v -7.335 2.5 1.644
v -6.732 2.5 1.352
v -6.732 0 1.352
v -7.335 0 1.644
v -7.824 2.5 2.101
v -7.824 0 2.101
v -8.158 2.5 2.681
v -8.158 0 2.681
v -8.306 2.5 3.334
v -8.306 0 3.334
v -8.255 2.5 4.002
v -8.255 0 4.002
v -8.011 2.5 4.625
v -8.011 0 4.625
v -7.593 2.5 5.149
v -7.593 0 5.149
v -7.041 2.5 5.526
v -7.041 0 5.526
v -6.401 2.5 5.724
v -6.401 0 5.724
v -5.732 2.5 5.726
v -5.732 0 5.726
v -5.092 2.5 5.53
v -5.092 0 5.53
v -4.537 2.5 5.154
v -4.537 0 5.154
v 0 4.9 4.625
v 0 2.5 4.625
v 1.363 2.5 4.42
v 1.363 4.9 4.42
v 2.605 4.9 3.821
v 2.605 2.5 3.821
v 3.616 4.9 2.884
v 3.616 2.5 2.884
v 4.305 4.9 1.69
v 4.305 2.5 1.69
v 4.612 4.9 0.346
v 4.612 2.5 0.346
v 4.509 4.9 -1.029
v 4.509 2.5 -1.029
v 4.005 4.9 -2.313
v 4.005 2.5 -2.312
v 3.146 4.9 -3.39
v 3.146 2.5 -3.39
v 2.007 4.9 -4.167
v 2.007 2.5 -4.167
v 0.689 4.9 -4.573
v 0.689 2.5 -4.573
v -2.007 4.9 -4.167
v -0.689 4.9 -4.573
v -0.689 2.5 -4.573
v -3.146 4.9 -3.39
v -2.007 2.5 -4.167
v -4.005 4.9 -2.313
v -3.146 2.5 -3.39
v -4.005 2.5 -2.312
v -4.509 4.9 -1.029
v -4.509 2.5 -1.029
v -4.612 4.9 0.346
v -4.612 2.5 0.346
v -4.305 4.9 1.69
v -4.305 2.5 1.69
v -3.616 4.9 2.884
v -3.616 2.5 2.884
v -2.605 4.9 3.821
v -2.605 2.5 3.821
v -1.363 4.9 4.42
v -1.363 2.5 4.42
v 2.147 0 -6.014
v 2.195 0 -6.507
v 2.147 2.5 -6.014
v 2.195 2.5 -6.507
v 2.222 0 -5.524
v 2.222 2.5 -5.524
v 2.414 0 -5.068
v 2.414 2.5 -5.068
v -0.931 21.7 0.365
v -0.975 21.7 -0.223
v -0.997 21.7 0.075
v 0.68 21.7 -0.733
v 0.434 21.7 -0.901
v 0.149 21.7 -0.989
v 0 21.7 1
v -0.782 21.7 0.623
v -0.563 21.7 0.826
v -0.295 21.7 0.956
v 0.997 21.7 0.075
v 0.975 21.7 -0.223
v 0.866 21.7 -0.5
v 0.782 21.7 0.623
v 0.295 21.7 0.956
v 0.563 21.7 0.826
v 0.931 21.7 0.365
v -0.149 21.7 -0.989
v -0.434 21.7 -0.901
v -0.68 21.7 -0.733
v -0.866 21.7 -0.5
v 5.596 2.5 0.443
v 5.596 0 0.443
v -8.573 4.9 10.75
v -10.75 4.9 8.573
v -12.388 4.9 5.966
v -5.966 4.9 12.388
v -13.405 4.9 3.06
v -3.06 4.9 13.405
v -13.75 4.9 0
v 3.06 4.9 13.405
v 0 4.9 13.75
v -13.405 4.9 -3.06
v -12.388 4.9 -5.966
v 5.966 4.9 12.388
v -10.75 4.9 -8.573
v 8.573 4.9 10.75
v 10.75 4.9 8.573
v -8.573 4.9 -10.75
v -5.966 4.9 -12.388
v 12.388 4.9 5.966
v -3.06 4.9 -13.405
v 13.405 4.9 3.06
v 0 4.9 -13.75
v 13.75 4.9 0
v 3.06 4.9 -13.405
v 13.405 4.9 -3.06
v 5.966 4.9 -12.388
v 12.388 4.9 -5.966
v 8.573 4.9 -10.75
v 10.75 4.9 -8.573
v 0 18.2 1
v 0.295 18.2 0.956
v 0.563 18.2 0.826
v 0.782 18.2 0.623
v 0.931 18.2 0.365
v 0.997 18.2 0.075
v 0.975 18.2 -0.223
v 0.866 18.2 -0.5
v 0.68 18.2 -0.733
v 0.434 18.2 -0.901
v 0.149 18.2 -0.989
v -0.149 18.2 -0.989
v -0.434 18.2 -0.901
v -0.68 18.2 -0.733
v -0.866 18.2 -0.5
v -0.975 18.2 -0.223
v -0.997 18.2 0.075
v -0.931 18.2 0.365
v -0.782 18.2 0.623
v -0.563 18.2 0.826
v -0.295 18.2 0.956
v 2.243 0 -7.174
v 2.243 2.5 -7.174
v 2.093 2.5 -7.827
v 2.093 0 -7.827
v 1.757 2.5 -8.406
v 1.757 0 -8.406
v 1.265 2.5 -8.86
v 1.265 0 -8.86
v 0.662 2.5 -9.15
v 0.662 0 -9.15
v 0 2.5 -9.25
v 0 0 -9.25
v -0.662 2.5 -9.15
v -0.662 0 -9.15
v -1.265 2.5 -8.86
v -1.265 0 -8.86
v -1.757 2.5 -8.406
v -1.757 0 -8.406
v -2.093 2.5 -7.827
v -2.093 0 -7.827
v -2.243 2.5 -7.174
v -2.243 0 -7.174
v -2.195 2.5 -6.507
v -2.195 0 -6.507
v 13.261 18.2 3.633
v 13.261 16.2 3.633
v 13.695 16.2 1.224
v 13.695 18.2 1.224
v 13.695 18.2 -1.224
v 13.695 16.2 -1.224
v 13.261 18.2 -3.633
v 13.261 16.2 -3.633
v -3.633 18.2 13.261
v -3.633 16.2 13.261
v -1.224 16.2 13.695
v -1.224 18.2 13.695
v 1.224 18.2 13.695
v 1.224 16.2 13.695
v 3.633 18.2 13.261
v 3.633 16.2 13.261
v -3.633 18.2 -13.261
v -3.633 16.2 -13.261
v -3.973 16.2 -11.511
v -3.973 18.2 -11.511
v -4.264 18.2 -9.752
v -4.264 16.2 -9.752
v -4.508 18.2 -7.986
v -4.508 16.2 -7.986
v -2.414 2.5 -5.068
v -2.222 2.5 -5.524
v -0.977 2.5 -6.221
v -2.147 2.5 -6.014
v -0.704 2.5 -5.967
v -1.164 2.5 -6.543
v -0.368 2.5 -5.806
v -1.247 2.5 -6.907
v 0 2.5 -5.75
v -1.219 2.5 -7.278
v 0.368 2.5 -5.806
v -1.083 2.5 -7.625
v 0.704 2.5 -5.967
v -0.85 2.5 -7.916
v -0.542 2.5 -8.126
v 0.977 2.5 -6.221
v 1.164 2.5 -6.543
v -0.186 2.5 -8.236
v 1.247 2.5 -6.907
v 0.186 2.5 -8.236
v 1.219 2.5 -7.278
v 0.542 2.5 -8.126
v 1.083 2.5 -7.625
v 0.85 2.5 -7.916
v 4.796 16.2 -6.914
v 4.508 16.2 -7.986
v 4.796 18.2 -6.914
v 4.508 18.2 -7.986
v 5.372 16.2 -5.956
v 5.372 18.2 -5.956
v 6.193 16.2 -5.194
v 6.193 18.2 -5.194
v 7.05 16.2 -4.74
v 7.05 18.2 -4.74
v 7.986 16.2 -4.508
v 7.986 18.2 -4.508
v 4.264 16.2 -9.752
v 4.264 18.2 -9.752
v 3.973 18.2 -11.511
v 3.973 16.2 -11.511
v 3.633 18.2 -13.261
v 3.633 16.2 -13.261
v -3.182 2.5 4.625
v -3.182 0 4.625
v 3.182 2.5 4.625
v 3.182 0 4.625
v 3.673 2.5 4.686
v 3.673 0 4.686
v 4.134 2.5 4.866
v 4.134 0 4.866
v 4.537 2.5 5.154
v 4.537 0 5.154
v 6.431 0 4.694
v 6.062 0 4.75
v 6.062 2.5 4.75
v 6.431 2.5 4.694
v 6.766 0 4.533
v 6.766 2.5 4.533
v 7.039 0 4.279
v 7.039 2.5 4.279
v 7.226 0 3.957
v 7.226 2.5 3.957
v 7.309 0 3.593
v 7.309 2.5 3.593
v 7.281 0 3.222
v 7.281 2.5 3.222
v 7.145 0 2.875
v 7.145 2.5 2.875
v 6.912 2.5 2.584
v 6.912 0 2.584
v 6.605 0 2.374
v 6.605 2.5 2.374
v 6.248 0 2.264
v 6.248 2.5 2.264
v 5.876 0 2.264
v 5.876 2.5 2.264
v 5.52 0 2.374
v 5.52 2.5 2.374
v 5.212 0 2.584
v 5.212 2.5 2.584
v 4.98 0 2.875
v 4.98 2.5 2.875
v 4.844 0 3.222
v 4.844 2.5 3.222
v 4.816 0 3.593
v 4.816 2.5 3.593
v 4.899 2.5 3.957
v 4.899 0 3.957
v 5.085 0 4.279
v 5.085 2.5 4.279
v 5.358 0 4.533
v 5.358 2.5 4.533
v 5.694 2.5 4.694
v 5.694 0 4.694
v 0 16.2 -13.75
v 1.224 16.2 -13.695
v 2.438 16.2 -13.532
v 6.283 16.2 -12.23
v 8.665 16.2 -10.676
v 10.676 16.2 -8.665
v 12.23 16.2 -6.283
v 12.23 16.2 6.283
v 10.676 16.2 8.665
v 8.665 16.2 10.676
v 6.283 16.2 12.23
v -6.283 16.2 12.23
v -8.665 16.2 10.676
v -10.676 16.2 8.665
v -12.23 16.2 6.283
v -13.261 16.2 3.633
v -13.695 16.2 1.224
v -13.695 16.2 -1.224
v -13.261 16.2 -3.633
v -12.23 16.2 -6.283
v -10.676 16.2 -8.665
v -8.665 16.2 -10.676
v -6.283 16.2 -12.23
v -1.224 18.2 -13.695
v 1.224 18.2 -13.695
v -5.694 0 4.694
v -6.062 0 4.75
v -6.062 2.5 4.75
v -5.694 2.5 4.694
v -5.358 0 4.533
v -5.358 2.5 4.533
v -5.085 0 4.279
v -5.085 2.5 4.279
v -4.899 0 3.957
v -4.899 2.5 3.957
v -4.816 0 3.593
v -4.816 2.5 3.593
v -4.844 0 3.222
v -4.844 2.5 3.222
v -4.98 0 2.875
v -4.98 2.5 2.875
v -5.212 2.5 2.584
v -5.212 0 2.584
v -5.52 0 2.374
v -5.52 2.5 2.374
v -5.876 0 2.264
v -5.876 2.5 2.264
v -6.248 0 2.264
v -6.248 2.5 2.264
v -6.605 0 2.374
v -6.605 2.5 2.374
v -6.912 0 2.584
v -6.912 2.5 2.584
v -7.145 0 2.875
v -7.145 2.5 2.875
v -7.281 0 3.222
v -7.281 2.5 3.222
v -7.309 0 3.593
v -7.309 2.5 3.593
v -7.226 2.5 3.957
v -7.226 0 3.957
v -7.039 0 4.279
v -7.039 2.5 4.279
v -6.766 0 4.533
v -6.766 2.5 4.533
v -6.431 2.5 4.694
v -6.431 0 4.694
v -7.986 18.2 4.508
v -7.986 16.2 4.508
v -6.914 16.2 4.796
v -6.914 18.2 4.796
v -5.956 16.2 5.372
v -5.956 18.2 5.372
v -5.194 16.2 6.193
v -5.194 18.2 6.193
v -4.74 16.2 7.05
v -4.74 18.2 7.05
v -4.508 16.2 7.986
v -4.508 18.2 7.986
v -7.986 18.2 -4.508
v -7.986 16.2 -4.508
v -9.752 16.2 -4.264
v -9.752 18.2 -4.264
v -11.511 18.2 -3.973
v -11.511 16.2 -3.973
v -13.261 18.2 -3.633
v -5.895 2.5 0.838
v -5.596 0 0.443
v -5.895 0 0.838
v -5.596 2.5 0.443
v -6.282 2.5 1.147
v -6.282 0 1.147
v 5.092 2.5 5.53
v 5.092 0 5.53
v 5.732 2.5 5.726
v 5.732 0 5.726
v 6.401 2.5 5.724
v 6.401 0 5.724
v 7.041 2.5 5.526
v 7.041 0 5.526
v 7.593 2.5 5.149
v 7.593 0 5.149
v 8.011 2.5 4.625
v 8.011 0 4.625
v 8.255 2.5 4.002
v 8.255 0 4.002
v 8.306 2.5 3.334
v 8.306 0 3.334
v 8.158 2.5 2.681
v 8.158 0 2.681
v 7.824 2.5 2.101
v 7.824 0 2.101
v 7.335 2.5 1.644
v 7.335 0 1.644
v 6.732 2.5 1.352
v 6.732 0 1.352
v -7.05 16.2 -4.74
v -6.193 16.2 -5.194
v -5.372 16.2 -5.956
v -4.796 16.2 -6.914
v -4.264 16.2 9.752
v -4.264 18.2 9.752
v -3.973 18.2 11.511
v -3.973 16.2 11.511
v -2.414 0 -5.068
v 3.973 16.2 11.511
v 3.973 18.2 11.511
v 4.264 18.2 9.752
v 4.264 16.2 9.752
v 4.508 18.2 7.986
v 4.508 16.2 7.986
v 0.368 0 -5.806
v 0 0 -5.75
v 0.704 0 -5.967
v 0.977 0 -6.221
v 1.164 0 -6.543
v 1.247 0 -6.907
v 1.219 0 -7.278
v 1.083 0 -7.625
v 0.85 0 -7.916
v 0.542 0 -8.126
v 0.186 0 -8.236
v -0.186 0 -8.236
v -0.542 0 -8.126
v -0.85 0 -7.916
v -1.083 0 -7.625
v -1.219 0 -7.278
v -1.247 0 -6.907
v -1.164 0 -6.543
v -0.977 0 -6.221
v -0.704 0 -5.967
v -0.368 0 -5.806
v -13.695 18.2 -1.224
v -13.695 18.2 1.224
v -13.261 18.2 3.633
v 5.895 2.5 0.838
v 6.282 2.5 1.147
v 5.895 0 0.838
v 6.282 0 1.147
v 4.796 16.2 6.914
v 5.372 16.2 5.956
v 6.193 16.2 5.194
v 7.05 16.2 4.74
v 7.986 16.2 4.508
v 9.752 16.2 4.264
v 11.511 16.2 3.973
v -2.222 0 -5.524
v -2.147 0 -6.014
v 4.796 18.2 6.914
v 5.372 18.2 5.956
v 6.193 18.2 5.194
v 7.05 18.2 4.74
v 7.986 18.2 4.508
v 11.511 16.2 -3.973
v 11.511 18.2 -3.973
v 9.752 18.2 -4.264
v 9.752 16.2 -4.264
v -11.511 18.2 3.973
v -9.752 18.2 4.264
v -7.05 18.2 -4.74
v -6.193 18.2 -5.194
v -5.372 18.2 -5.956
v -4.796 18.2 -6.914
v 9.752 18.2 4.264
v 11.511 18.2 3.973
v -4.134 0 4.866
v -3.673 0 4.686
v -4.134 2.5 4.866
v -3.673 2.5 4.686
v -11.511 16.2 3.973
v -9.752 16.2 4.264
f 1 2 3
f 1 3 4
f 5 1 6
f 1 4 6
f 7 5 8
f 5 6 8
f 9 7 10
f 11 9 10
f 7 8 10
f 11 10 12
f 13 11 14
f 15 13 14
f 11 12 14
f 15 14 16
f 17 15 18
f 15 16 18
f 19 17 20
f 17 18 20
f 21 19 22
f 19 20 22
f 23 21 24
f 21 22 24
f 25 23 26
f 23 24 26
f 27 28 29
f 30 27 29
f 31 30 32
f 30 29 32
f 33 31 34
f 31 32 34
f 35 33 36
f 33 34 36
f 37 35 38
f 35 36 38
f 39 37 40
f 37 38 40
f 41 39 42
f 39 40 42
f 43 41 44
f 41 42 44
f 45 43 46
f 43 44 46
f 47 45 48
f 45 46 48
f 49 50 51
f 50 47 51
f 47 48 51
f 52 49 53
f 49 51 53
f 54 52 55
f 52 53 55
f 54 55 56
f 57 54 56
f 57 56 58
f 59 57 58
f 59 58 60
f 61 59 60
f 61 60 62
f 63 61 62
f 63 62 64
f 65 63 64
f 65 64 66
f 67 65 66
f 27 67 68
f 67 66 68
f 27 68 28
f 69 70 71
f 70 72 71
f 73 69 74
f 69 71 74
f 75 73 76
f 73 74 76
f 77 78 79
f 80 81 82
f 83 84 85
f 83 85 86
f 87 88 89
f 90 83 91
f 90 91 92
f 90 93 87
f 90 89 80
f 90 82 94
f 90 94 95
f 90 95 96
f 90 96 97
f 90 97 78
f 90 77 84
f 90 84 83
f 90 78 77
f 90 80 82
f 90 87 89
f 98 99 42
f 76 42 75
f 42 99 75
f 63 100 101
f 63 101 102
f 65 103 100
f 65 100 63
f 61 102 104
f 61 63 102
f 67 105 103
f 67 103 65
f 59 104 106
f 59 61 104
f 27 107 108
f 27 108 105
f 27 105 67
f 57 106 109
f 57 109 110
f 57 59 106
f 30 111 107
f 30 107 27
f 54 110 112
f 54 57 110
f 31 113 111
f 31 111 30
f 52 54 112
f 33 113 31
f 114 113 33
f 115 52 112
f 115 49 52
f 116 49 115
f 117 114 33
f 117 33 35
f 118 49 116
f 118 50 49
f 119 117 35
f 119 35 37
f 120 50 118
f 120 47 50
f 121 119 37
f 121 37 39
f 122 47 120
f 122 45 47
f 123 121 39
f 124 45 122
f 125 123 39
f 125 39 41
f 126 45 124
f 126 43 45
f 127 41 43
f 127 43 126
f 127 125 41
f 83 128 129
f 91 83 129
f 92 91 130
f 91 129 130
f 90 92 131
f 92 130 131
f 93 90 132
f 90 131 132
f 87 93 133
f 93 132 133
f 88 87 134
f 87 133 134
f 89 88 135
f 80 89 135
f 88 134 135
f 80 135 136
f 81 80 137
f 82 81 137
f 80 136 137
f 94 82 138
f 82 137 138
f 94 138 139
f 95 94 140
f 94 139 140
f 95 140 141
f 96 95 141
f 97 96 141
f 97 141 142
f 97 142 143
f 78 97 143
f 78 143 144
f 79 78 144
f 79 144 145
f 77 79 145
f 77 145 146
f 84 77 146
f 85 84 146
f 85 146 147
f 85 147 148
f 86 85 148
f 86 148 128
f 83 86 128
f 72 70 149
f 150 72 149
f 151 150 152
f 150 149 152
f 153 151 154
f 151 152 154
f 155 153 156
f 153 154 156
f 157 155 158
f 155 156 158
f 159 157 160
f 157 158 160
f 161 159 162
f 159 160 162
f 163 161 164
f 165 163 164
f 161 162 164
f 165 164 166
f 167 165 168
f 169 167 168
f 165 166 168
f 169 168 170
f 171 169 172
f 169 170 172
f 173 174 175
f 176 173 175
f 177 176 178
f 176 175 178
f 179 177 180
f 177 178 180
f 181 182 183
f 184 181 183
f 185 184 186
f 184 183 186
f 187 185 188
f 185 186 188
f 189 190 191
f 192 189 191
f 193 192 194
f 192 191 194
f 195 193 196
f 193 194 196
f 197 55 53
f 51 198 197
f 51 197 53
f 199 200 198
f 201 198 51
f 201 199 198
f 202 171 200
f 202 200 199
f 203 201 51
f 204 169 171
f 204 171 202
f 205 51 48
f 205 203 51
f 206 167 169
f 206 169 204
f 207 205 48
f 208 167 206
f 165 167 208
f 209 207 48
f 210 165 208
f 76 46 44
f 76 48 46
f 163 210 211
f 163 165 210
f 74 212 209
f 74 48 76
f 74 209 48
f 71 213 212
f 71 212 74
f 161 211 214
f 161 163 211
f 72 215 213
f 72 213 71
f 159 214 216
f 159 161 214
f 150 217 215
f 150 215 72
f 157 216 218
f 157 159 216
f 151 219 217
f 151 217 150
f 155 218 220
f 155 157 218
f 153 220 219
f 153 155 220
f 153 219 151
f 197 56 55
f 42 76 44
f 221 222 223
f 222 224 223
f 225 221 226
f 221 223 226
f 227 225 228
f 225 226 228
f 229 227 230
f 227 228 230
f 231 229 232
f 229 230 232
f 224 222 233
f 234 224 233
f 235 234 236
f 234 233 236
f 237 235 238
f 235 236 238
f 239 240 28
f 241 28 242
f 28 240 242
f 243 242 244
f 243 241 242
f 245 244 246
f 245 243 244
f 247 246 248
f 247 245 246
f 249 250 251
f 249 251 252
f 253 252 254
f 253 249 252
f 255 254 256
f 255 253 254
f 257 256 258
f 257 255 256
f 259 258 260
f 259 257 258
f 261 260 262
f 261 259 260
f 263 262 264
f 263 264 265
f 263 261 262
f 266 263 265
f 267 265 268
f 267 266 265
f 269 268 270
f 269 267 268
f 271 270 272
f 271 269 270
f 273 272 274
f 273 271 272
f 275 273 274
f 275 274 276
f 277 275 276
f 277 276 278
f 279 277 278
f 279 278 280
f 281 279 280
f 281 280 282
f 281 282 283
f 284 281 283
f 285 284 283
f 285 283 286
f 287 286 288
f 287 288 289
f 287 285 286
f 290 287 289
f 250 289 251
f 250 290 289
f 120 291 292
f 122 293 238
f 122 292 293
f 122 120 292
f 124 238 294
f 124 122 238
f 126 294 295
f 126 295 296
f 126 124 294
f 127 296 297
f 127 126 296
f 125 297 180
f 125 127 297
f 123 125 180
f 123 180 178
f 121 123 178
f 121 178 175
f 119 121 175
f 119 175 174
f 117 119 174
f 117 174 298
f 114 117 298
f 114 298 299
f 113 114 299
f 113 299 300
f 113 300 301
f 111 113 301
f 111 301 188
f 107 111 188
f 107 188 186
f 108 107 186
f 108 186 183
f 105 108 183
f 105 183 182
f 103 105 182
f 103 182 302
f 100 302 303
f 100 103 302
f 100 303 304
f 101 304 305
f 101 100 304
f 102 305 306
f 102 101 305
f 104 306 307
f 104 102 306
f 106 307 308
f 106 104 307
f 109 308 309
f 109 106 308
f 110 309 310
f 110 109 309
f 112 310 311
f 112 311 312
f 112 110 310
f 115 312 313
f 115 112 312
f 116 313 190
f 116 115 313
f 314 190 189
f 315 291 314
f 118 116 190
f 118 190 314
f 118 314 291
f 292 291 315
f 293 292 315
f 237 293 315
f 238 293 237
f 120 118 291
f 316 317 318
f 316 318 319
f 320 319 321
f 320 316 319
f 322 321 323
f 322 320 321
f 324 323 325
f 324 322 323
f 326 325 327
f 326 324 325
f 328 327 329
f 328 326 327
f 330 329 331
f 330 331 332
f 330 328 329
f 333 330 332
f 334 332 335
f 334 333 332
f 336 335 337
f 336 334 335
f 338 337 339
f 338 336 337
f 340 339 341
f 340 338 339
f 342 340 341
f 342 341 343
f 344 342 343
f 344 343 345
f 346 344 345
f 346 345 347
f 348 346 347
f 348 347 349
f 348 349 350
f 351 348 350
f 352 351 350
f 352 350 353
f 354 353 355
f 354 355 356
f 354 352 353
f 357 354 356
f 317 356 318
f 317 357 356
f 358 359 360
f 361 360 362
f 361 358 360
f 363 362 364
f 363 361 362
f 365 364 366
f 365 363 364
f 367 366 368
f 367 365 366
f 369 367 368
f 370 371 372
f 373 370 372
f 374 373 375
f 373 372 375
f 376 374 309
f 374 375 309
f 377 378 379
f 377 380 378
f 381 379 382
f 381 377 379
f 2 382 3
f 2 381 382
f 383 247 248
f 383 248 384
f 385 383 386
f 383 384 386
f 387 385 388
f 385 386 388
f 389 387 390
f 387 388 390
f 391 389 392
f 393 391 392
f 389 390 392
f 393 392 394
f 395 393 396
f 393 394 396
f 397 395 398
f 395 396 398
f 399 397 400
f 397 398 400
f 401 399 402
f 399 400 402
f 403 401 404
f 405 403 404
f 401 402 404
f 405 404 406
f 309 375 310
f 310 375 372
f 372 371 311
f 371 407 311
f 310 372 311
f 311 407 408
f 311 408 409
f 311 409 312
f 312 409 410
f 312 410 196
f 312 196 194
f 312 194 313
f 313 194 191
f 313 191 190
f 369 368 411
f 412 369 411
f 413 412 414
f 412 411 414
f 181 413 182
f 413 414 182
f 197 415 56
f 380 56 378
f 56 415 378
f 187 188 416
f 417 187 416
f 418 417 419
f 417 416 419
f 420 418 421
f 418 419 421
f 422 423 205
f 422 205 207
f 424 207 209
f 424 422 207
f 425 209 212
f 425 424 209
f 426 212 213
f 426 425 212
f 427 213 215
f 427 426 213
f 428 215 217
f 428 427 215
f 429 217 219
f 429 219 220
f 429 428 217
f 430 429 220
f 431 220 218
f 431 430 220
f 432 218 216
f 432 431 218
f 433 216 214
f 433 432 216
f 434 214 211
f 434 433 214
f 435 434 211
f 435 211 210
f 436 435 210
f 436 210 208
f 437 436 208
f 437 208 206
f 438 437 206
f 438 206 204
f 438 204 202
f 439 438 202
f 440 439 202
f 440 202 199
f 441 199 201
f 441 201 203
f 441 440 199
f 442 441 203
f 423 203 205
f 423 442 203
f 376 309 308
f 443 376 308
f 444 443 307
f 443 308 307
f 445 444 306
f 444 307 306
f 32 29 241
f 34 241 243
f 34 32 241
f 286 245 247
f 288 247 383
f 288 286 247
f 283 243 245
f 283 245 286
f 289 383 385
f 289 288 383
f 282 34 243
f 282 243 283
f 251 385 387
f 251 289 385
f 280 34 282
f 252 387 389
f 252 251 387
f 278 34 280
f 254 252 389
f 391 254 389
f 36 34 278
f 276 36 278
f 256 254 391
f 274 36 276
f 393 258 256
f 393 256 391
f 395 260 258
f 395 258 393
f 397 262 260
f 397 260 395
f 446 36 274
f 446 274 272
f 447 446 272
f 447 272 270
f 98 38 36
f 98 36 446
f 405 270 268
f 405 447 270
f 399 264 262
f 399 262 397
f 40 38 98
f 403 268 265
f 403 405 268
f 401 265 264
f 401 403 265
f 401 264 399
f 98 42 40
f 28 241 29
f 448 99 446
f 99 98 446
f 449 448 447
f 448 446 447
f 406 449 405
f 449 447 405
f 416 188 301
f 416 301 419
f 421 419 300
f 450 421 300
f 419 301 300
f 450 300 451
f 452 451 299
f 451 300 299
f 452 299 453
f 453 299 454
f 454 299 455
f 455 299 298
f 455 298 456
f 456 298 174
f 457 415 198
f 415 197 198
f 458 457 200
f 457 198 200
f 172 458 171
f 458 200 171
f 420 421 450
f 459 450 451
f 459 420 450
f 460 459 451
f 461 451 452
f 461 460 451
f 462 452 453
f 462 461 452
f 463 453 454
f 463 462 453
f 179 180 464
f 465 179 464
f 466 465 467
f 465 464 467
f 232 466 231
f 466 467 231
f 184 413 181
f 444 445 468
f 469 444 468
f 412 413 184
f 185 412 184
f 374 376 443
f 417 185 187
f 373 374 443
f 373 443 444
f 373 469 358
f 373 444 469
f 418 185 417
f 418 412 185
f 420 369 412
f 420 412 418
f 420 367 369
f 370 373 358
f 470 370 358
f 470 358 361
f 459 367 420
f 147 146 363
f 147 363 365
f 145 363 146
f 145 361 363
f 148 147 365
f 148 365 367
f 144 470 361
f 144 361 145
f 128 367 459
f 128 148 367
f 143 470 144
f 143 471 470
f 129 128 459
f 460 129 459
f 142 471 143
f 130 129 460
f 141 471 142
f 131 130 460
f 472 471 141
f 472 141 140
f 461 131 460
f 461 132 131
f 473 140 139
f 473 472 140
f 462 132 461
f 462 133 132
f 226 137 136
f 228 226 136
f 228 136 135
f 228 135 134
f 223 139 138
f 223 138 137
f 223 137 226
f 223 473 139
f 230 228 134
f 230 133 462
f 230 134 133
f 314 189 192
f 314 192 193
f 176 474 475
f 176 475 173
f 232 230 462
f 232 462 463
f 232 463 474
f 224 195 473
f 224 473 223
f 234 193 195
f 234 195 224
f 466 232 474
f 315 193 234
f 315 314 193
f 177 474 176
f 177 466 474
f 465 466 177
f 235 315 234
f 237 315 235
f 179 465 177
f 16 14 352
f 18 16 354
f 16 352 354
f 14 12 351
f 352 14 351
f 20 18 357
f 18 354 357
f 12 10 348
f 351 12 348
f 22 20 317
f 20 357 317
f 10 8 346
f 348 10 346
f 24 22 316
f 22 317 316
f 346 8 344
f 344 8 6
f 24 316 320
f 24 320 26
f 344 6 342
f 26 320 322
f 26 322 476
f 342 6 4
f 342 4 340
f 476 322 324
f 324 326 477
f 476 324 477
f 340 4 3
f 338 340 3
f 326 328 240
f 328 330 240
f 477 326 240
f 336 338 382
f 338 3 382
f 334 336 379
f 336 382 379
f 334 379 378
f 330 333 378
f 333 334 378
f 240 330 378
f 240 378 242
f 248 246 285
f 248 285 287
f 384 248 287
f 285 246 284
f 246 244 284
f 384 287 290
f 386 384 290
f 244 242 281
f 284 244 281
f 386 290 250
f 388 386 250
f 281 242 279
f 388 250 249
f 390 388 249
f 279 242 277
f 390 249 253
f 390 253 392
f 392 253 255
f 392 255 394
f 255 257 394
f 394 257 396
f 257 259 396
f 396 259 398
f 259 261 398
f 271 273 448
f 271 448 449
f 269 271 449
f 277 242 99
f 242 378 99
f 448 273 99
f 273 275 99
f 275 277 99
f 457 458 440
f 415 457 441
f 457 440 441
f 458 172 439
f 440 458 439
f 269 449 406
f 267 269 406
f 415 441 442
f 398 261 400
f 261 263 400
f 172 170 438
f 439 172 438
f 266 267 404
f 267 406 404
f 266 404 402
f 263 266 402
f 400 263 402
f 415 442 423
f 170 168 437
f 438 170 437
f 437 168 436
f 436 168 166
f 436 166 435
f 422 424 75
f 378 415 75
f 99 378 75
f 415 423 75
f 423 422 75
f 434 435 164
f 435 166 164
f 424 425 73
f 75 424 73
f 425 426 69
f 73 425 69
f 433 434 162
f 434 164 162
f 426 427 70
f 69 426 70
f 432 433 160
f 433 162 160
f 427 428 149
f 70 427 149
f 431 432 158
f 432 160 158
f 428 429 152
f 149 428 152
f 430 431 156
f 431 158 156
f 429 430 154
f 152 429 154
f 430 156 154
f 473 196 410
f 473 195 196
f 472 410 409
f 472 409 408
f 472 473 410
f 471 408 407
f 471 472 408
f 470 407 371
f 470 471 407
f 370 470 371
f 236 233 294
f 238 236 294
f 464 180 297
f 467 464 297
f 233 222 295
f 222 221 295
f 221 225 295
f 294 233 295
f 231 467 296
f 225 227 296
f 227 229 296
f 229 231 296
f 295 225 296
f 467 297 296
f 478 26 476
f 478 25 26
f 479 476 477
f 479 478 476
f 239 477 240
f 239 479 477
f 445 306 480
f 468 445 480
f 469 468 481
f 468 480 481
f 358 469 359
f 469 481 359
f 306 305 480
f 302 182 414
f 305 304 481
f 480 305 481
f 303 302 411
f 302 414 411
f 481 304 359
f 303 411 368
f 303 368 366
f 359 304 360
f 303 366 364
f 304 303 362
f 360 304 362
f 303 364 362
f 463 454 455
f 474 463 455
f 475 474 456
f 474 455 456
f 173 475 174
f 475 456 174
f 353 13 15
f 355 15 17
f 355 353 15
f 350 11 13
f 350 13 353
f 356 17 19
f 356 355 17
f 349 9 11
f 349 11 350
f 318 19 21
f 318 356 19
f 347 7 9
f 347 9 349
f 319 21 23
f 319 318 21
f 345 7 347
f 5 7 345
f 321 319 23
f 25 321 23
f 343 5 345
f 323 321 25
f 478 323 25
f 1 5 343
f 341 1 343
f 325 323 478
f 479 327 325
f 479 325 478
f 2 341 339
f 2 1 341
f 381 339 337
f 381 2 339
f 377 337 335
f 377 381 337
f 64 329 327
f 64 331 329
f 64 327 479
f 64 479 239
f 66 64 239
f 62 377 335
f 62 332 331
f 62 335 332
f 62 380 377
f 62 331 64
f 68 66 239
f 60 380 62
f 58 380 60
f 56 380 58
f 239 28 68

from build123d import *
from build123d.topology import SkipClean

# Parameters (mm, degrees)
SKETCH_1_R      = 1.25
EXTRUDE_1_DEPTH = 2.5
FILLET_1_R      = 2
SKETCH_2_R      = 4.625
EXTRUDE_2_DEPTH = 13.7
SKETCH_3_R      = 1
EXTRUDE_3_DEPTH = 5.5
EXTRUDE_4_DEPTH = 2
EXTRUDE_START   = 11.3
SKETCH_5_R      = 13.75
EXTRUDE_5_DEPTH = 11.3
FILLET_2_R      = 4


with BuildPart() as part:
    # 草图1 → 凸台-拉伸1 (new body)
    with BuildSketch(Plane(origin=(0, 0, 0), x_dir=(1, 0, 0), z_dir=(0, 1, 0))):
        with BuildLine():
            Line((-1.948557159, 5.875), (-6.062177826, -1.25))
            ThreePointArc((-6.062177826, -1.25), (-8.010734985, -4.625), (-4.113620668, -4.625))
            Line((-4.113620668, -4.625), (4.113620668, -4.625))
            ThreePointArc((4.113620668, -4.625), (8.010734985, -4.625), (6.062177826, -1.25))
            Line((6.062177826, -1.25), (1.948557159, 5.875))
            ThreePointArc((1.948557159, 5.875), (0, 9.25), (-1.948557159, 5.875))
        make_face()
        with Locations(Location((0, 7, 0), (0, 0, 270))):
            Circle(SKETCH_1_R, mode=Mode.SUBTRACT)
        with Locations(Location((-6.062177826, -3.5, 0), (0, 0, 270))):
            Circle(SKETCH_1_R, mode=Mode.SUBTRACT)
        with Locations(Location((6.062177826, -3.5, 0), (0, 0, 270))):
            Circle(SKETCH_1_R, mode=Mode.SUBTRACT)
    extrude(amount=EXTRUDE_1_DEPTH)

    # 圆角1
    fillet_1_edges = [part.edges().sort_by_distance(p)[0] for p in [
        (-6.062177826, 1.25, 1.25),
        (-1.948557159, 1.25, -5.875),
        (1.948557159, 1.25, -5.875),
        (6.062177826, 1.25, 1.25),
        (4.113620668, 1.25, 4.625),
        (-4.113620668, 1.25, 4.625),
    ]]
    fillet(fillet_1_edges, radius=FILLET_1_R)

    # 草图2 → 凸台-拉伸2 (add)
    with BuildSketch(Plane(origin=(0, 2.5, 0), x_dir=(1, 0, 0), z_dir=(0, 1, 0))):
        with Locations(Location((0, 0, 0), (0, 0, 270))):
            Circle(SKETCH_2_R)
    extrude(amount=EXTRUDE_2_DEPTH)

    # 草图3 → 凸台-拉伸3 (add)
    with BuildSketch(Plane(origin=(0, 16.2, 0), x_dir=(1, 0, 0), z_dir=(0, 1, 0))):
        with Locations(Location((0, 0, 0), (0, 0, 270))):
            Circle(SKETCH_3_R)
    extrude(amount=EXTRUDE_3_DEPTH)

    # 草图4 → 凸台-拉伸4 (add)
    with BuildSketch(Plane(origin=(0, 16.2, 0), x_dir=(1, 0, 0), z_dir=(0, 1, 0))):
        with BuildLine():
            ThreePointArc((-3.6328125, -13.261416717), (0, -13.75), (3.6328125, -13.261416717))
            ThreePointArc((3.6328125, -13.261416717), (4.365393547, -9.060690569), (4.820970693, -4.820970693))
            ThreePointArc((4.820970693, -4.820970693), (9.060690569, -4.365393547), (13.261416717, -3.6328125))
            ThreePointArc((13.261416717, -3.6328125), (13.75, 0), (13.261416717, 3.6328125))
            ThreePointArc((13.261416717, 3.6328125), (9.060690569, 4.365393547), (4.820970693, 4.820970693))
            ThreePointArc((4.820970693, 4.820970693), (4.365393547, 9.060690569), (3.6328125, 13.261416717))
            ThreePointArc((3.6328125, 13.261416717), (0, 13.75), (-3.6328125, 13.261416717))
            ThreePointArc((-3.6328125, 13.261416717), (-4.365393547, 9.060690569), (-4.820970693, 4.820970693))
            ThreePointArc((-4.820970693, 4.820970693), (-9.060690569, 4.365393547), (-13.261416717, 3.6328125))
            ThreePointArc((-13.261416717, 3.6328125), (-13.75, 0), (-13.261416717, -3.6328125))
            ThreePointArc((-13.261416717, -3.6328125), (-9.060690569, -4.365393547), (-4.820970693, -4.820970693))
            ThreePointArc((-4.820970693, -4.820970693), (-4.365393547, -9.060690569), (-3.6328125, -13.261416717))
        make_face()
    extrude(amount=EXTRUDE_4_DEPTH)

    # 草图5 → 凸台-拉伸5 (add)
    with SkipClean():  # the faces are left unmerged after this step: merging them gives an invalid solid
        with BuildSketch(Plane.XZ.offset(-16.2).offset(EXTRUDE_START)):
            with Locations(Location((0, 0, 0), (0, 0, 270))):
                Circle(SKETCH_5_R)
        extrude(amount=-EXTRUDE_5_DEPTH)

    # 圆角2
    fillet_2_edges = [part.edges().sort_by_distance(p)[0] for p in [
        (-4.820970693, 17.2, 4.820970693),
        (4.820970693, 17.2, 4.820970693),
        (4.820970693, 17.2, -4.820970693),
        (-4.820970693, 17.2, -4.820970693),
    ]]
    fillet(fillet_2_edges, radius=FILLET_2_R)


solid = part.part
